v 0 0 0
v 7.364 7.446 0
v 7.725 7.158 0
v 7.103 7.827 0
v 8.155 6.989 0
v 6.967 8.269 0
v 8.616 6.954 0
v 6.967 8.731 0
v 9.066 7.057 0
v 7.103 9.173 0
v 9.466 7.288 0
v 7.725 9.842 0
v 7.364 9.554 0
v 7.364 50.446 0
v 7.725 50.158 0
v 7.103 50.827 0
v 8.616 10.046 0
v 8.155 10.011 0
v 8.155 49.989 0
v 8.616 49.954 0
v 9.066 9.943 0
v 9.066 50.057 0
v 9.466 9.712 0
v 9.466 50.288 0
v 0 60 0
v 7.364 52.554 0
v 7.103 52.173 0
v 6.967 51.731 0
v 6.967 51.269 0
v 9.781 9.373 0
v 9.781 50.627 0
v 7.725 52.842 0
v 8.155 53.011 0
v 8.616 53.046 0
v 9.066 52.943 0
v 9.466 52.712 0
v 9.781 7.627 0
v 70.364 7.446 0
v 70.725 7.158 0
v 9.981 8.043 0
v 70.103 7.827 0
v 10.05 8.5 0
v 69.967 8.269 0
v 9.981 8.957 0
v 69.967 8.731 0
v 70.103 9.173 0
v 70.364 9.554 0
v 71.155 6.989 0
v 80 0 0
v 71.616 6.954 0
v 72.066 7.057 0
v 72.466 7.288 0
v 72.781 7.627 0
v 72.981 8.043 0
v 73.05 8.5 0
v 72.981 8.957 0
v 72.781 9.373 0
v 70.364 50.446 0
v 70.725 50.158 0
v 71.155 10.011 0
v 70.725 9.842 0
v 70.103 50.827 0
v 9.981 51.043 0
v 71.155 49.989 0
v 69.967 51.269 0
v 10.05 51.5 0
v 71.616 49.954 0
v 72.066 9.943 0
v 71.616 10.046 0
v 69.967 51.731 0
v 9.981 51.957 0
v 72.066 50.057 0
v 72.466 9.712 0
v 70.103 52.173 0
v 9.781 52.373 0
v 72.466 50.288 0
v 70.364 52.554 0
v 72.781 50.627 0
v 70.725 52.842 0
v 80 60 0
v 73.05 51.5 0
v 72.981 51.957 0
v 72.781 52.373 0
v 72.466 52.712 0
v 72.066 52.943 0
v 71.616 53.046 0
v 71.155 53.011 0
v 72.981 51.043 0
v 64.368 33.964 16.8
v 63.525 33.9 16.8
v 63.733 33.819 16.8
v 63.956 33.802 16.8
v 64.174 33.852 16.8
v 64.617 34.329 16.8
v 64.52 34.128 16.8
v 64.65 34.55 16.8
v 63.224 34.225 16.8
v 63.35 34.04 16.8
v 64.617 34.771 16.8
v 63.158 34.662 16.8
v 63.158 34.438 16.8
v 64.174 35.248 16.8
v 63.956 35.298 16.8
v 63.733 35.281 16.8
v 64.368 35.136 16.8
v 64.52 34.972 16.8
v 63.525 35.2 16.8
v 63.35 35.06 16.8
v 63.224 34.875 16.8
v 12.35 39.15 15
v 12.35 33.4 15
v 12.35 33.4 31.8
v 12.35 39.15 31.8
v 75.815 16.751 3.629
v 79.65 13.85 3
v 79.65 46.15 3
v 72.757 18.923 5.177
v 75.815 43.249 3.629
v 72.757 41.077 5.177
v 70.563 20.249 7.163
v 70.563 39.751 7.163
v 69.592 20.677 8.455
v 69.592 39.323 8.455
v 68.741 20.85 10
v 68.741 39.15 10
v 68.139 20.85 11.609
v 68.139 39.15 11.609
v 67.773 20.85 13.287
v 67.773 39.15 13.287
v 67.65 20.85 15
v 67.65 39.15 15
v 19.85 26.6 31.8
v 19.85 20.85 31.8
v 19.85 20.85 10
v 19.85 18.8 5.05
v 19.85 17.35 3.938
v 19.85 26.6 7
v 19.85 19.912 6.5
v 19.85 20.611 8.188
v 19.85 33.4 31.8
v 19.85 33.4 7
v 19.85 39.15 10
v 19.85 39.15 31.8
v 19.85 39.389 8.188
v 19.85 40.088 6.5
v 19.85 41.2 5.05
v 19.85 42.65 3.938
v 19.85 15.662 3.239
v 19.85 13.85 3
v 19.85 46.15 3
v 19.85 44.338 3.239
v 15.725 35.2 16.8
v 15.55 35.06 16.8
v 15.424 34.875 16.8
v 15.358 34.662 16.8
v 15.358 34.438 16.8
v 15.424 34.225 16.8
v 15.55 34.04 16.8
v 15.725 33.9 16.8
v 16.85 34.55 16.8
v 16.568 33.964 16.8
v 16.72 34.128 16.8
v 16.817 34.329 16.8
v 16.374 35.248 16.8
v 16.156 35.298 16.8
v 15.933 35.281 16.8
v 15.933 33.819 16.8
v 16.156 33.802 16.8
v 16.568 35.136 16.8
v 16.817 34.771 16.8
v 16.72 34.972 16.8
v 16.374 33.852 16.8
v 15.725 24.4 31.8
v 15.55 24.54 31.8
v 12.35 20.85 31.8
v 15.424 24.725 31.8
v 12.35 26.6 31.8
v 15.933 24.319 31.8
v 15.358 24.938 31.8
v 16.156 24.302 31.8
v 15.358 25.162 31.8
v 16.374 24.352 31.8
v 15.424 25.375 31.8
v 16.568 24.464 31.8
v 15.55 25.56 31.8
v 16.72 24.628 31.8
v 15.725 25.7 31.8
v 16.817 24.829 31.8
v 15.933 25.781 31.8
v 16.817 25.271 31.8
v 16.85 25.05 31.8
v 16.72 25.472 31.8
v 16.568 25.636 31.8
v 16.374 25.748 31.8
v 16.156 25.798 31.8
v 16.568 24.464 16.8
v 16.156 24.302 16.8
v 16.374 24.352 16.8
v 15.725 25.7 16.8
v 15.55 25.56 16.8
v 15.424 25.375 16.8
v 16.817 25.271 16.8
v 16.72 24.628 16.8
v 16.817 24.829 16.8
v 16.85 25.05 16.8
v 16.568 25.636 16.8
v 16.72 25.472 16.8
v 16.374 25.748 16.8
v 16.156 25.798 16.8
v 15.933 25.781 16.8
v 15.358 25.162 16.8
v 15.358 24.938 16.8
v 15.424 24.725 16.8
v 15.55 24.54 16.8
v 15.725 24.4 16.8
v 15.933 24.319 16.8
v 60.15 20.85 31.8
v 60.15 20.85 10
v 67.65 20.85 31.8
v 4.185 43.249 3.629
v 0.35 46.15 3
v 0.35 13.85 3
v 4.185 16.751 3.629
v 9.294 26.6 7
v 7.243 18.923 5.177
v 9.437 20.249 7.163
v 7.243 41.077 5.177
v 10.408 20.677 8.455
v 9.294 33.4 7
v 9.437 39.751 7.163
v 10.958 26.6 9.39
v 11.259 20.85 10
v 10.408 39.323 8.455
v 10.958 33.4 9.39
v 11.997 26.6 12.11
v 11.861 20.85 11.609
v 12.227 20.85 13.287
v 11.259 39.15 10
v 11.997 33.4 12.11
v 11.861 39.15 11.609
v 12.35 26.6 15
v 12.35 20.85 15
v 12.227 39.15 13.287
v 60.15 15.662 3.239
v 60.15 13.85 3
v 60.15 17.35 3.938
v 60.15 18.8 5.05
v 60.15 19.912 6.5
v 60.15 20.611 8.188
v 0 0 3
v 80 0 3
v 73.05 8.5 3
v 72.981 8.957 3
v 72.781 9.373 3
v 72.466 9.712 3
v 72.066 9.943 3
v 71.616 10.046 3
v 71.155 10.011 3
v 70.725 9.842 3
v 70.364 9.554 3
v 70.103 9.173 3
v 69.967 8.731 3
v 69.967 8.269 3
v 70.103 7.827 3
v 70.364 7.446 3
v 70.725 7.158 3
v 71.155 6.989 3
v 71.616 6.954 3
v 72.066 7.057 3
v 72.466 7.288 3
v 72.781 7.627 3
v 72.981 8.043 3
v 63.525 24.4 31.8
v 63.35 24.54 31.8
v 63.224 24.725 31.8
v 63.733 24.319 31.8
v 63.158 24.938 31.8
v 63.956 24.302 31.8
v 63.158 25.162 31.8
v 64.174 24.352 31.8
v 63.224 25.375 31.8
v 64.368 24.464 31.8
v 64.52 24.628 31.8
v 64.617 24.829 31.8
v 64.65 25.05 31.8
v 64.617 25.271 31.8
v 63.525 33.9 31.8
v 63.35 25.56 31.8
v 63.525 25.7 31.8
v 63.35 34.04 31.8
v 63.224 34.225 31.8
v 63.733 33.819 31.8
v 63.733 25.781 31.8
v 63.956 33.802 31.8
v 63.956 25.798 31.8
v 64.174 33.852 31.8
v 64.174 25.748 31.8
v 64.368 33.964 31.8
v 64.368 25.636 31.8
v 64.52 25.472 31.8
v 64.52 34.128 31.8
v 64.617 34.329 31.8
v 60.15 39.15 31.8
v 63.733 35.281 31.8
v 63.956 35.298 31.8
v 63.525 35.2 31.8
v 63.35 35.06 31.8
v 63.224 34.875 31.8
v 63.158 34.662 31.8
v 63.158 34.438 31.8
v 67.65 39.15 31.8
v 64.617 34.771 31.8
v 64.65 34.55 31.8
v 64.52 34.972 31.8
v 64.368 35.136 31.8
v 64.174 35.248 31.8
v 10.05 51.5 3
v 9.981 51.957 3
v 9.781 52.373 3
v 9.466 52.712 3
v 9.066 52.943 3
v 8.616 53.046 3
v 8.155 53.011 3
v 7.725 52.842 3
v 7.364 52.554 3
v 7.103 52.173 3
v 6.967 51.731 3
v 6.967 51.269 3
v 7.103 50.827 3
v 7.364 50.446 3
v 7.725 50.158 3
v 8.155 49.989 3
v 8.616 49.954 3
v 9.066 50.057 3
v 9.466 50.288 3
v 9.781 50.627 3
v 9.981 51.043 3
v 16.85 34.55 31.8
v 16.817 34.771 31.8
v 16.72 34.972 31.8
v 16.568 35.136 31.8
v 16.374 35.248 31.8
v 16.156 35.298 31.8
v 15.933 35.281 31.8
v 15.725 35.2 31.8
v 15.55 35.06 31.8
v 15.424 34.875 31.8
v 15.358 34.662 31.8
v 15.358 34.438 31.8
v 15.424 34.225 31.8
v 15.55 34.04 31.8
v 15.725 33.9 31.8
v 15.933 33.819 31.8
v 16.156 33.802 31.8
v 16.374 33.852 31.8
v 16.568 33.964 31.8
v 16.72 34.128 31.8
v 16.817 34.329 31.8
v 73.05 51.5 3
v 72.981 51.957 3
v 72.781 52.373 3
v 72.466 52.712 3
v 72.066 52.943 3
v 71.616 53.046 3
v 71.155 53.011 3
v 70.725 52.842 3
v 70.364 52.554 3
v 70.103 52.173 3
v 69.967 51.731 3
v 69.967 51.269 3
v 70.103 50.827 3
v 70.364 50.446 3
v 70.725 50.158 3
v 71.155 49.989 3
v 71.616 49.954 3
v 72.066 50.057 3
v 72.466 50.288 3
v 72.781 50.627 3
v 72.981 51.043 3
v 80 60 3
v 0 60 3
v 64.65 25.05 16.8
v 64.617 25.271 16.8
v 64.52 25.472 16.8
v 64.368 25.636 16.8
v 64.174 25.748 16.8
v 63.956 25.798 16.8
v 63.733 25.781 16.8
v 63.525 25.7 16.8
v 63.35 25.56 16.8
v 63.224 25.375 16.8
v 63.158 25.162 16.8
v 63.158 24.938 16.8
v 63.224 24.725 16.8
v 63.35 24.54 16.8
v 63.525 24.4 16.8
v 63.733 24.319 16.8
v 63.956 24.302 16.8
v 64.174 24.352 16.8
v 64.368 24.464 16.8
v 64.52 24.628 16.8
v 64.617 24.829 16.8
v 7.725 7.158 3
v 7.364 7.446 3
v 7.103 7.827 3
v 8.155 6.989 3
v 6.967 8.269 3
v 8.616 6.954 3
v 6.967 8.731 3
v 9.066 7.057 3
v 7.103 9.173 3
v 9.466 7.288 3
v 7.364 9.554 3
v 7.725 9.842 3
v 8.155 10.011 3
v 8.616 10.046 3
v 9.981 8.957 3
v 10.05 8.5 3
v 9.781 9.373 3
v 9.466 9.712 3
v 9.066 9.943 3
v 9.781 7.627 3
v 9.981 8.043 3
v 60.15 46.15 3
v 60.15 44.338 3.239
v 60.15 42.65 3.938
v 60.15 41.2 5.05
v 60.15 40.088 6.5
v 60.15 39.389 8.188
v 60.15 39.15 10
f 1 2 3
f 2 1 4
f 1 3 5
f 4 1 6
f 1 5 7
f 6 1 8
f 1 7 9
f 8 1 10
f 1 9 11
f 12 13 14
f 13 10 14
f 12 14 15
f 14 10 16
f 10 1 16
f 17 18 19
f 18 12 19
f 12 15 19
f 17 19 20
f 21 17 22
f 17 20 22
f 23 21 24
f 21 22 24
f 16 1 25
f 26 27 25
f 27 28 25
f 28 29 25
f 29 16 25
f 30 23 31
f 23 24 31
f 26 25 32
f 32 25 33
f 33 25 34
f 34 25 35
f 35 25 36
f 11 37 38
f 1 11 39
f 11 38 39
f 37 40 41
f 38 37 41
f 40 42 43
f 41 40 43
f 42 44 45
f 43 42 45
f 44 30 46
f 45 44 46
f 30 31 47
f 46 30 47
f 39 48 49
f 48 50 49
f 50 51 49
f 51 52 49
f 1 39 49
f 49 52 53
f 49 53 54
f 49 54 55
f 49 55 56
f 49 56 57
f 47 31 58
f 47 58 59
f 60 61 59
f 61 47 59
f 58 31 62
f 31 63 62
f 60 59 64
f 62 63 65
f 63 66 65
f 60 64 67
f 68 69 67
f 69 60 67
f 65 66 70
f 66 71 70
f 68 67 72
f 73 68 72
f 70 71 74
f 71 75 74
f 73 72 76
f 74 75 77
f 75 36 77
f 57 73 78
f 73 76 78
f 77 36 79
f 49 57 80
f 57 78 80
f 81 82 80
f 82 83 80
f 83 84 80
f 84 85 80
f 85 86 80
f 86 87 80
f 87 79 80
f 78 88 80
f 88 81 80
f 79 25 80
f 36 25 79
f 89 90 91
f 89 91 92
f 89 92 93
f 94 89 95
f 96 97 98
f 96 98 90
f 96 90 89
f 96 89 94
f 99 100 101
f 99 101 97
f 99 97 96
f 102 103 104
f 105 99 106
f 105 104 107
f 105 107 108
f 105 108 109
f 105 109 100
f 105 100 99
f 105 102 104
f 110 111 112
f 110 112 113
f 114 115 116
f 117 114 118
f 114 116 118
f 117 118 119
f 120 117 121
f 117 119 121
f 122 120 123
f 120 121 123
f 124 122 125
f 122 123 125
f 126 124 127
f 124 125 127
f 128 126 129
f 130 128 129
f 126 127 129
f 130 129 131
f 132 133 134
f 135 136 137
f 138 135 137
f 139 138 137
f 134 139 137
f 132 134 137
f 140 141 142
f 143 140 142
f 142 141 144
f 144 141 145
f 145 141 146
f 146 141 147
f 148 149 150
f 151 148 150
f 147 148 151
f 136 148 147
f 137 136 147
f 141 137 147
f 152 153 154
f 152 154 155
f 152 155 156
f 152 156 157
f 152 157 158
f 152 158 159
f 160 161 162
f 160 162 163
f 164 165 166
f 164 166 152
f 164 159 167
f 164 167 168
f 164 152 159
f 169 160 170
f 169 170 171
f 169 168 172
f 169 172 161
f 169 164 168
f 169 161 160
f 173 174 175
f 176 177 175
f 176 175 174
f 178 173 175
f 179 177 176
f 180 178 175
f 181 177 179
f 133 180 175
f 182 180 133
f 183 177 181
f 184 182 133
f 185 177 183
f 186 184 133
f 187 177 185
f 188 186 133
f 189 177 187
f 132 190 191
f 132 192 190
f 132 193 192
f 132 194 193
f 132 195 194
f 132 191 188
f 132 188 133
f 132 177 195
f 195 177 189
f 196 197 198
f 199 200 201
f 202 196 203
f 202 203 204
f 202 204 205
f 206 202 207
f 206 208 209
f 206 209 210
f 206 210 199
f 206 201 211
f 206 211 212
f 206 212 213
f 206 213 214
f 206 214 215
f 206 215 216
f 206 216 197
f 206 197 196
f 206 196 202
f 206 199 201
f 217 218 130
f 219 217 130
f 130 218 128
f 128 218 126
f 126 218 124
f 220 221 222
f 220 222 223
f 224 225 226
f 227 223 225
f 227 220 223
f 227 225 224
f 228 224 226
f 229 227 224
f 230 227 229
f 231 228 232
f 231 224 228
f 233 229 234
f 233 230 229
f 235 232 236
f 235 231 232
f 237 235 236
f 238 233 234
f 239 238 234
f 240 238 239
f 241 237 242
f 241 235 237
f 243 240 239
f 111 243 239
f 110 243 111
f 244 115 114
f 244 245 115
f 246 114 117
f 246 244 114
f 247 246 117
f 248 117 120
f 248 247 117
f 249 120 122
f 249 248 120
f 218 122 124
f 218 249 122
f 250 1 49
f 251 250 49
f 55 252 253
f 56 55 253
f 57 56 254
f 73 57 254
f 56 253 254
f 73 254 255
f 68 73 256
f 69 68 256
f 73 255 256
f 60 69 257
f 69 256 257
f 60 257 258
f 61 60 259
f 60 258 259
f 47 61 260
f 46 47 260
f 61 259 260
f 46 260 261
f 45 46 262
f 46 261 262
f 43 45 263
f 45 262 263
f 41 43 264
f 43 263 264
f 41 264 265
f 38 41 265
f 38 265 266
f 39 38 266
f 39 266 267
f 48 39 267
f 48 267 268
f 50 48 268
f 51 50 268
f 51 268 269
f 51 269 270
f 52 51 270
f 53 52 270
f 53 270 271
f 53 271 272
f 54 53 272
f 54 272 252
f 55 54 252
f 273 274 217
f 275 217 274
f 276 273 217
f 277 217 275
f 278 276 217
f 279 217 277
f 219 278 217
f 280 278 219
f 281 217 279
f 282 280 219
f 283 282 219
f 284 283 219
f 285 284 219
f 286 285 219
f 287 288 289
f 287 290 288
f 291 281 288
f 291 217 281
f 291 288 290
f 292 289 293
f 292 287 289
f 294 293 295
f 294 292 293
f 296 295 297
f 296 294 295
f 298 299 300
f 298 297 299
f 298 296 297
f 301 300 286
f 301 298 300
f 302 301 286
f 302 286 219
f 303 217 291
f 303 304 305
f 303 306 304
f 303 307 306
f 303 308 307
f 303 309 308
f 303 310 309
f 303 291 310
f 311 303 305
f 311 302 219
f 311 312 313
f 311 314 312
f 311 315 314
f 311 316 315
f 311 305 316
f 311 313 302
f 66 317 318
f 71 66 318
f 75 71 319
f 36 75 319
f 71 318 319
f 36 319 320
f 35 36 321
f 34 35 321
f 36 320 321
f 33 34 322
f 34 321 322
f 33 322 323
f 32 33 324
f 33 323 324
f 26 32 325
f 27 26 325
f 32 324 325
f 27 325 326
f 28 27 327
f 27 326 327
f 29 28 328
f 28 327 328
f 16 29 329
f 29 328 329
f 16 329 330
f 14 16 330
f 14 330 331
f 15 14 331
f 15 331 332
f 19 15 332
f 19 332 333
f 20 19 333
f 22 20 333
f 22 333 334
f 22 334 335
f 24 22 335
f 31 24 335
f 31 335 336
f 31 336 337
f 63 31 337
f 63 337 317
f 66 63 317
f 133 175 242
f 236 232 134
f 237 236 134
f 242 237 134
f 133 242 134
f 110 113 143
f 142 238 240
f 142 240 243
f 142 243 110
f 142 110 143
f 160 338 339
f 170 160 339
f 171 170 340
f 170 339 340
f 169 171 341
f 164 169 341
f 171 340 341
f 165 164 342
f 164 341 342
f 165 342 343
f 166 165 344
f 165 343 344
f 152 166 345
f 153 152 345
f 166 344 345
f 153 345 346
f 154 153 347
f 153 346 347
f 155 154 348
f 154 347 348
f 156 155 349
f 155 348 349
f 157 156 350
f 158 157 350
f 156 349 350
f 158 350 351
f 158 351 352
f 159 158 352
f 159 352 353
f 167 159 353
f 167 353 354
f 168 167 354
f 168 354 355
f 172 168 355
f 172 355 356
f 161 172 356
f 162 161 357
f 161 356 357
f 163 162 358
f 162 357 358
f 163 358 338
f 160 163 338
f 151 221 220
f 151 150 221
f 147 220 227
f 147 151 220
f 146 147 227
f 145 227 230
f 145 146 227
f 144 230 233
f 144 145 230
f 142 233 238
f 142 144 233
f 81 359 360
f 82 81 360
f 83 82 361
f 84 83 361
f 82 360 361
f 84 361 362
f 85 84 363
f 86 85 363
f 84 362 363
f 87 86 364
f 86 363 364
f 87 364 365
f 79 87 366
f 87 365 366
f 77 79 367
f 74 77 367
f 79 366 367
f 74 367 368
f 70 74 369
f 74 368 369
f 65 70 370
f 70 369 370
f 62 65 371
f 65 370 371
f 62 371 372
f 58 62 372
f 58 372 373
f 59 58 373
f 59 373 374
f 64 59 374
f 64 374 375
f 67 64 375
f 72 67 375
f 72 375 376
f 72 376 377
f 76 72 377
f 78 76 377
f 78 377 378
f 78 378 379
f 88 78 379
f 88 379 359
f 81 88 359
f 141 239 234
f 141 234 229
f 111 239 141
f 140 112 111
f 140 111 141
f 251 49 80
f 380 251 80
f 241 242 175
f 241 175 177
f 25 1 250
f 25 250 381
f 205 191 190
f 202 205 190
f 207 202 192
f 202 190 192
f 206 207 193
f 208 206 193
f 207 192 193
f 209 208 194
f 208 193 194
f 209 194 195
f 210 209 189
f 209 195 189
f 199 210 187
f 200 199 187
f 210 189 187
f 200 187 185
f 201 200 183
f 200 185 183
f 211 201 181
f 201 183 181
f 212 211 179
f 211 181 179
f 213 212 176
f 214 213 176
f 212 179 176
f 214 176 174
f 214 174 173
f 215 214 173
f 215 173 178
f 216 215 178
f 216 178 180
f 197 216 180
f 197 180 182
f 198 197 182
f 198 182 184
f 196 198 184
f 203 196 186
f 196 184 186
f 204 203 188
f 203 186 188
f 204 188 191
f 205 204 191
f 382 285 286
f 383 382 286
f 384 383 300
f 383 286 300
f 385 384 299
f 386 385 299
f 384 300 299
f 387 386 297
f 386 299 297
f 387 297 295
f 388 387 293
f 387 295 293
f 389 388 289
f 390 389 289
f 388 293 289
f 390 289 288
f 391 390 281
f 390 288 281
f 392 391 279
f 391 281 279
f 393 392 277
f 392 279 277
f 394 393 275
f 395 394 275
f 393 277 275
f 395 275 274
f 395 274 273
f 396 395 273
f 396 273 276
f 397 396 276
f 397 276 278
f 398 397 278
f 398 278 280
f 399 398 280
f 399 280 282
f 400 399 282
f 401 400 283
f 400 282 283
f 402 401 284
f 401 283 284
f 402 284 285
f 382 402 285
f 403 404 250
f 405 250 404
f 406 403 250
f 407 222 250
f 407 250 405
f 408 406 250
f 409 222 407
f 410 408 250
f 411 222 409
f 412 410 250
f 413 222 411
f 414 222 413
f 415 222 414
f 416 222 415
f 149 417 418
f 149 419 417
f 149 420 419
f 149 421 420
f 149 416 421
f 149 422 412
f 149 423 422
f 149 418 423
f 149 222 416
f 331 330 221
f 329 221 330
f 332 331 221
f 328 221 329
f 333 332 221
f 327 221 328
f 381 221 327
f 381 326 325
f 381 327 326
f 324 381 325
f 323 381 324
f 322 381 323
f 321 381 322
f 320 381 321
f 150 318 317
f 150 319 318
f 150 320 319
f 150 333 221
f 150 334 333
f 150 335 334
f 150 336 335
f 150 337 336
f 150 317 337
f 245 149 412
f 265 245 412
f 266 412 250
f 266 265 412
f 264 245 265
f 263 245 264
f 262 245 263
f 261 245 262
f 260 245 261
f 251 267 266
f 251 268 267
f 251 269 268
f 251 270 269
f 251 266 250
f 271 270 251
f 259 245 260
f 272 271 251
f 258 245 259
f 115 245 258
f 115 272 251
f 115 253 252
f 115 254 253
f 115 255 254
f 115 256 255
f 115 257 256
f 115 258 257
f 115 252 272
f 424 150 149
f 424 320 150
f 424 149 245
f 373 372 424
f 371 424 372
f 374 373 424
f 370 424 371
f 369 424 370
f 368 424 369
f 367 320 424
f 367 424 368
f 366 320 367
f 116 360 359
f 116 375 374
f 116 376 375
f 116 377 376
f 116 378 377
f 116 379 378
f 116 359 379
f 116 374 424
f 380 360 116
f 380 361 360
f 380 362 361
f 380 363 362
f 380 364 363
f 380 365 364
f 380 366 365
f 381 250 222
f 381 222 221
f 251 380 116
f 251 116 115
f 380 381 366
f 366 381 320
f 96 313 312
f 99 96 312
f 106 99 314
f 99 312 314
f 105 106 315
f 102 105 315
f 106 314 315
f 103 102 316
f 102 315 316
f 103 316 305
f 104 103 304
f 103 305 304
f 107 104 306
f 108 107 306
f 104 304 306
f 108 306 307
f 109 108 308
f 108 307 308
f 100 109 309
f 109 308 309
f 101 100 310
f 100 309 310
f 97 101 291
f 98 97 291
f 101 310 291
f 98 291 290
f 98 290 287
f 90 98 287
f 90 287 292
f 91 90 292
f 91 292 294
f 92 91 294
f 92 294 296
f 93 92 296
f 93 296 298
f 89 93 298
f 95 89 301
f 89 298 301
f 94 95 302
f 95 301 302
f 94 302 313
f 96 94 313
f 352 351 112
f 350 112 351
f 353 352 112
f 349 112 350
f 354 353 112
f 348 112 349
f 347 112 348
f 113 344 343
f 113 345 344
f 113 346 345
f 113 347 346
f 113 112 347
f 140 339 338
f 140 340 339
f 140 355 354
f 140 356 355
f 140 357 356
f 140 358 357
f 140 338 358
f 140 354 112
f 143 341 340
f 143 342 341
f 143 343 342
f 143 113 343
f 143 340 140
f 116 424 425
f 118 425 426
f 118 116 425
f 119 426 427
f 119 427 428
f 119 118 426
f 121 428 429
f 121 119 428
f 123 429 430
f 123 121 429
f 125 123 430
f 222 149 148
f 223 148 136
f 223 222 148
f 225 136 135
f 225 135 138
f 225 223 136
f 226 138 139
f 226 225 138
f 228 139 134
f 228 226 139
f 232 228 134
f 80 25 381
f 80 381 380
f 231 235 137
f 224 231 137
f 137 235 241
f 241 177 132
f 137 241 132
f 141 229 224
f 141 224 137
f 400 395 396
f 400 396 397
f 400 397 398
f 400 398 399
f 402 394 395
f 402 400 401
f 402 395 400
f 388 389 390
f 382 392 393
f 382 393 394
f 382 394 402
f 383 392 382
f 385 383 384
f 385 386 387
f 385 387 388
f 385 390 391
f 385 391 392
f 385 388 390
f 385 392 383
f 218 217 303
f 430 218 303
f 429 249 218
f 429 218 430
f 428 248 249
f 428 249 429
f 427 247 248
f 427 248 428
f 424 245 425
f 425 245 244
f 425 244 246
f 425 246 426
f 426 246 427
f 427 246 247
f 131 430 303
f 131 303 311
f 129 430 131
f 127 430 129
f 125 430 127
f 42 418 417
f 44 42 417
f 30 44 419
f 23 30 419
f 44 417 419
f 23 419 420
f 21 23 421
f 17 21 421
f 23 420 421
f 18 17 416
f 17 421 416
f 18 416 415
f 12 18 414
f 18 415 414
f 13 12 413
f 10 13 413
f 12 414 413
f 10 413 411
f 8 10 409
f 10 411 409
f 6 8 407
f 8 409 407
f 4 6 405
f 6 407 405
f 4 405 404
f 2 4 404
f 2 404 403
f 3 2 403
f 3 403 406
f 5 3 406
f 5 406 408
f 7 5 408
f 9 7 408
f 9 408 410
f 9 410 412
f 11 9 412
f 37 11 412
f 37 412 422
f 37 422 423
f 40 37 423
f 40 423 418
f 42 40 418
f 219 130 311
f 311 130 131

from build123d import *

# Parameters (mm, degrees)
SKETCH078_W     = 80
SKETCH078_H     = 60
PAD029_DEPTH    = 3
SKETCH079_W     = 7.5
SKETCH079_H     = 18.3
PAD030_DEPTH    = 28.8
SKETCH080_R     = 1.55
POCKET038_DEPTH = 5
SKETCH081_R     = 0.75
POCKET039_DEPTH = 15
FILLET024_R     = 12
FILLET025_R     = 7
SKETCH082_W     = 19.5
SKETCH082_H     = 6.8
POCKET040_DEPTH = 24.8


with BuildPart() as part:
    # Sketch078 → Pad029 (new body)
    with BuildSketch(Plane.XY):
        with Locations((40, 30)):
            Rectangle(SKETCH078_W, SKETCH078_H)
    extrude(amount=PAD029_DEPTH)

    # Sketch079 (on Face6 of Pad029) → Pad030 (join)
    with BuildSketch(Plane.XY.offset(3)):
        with Locations((16.1, 30)):
            Rectangle(SKETCH079_W, SKETCH079_H)
        with Locations((63.9, 30)):
            Rectangle(SKETCH079_W, SKETCH079_H)
    extrude(amount=PAD030_DEPTH)

    # Sketch080 (on Face5 of Pad030) → Pocket038 (cut)
    with BuildSketch(Plane.XY.offset(3)):
        with Locations((71.5, 51.5)):
            Circle(SKETCH080_R)
        with Locations((8.5, 51.5)):
            Circle(SKETCH080_R)
        with Locations((71.5, 8.5)):
            Circle(SKETCH080_R)
        with Locations((8.5, 8.5)):
            Circle(SKETCH080_R)
    extrude(amount=-POCKET038_DEPTH, mode=Mode.SUBTRACT)

    # Sketch081 (on Face19 of Pocket038) → Pocket039 (cut)
    with BuildSketch(Plane.XY.offset(31.8)):
        with Locations((16.1, 34.55)):
            Circle(SKETCH081_R)
        with Locations((16.1, 25.05)):
            Circle(SKETCH081_R)
        with Locations((63.9, 34.55)):
            Circle(SKETCH081_R)
        with Locations((63.9, 25.05)):
            Circle(SKETCH081_R)
    extrude(amount=-POCKET039_DEPTH, mode=Mode.SUBTRACT)

    # Fillet024
    fillet024_edges = [part.edges().sort_by_distance(p)[0] for p in [
        (12.35, 30, 3),
        (67.65, 30, 3),
    ]]
    fillet(fillet024_edges, radius=FILLET024_R)

    # Fillet025
    fillet025_edges = [part.edges().sort_by_distance(p)[0] for p in [
        (16.1, 20.85, 3),
        (63.9, 20.85, 3),
        (63.9, 39.15, 3),
        (16.1, 39.15, 3),
    ]]
    fillet(fillet025_edges, radius=FILLET025_R)

    # Sketch082 (on Face19 of Pocket039) → Pocket040 (cut)
    with BuildSketch(Plane.XY.offset(31.8)):
        with Locations((10.1, 30)):
            Rectangle(SKETCH082_W, SKETCH082_H)
    extrude(amount=-POCKET040_DEPTH, mode=Mode.SUBTRACT)


solid = part.part
